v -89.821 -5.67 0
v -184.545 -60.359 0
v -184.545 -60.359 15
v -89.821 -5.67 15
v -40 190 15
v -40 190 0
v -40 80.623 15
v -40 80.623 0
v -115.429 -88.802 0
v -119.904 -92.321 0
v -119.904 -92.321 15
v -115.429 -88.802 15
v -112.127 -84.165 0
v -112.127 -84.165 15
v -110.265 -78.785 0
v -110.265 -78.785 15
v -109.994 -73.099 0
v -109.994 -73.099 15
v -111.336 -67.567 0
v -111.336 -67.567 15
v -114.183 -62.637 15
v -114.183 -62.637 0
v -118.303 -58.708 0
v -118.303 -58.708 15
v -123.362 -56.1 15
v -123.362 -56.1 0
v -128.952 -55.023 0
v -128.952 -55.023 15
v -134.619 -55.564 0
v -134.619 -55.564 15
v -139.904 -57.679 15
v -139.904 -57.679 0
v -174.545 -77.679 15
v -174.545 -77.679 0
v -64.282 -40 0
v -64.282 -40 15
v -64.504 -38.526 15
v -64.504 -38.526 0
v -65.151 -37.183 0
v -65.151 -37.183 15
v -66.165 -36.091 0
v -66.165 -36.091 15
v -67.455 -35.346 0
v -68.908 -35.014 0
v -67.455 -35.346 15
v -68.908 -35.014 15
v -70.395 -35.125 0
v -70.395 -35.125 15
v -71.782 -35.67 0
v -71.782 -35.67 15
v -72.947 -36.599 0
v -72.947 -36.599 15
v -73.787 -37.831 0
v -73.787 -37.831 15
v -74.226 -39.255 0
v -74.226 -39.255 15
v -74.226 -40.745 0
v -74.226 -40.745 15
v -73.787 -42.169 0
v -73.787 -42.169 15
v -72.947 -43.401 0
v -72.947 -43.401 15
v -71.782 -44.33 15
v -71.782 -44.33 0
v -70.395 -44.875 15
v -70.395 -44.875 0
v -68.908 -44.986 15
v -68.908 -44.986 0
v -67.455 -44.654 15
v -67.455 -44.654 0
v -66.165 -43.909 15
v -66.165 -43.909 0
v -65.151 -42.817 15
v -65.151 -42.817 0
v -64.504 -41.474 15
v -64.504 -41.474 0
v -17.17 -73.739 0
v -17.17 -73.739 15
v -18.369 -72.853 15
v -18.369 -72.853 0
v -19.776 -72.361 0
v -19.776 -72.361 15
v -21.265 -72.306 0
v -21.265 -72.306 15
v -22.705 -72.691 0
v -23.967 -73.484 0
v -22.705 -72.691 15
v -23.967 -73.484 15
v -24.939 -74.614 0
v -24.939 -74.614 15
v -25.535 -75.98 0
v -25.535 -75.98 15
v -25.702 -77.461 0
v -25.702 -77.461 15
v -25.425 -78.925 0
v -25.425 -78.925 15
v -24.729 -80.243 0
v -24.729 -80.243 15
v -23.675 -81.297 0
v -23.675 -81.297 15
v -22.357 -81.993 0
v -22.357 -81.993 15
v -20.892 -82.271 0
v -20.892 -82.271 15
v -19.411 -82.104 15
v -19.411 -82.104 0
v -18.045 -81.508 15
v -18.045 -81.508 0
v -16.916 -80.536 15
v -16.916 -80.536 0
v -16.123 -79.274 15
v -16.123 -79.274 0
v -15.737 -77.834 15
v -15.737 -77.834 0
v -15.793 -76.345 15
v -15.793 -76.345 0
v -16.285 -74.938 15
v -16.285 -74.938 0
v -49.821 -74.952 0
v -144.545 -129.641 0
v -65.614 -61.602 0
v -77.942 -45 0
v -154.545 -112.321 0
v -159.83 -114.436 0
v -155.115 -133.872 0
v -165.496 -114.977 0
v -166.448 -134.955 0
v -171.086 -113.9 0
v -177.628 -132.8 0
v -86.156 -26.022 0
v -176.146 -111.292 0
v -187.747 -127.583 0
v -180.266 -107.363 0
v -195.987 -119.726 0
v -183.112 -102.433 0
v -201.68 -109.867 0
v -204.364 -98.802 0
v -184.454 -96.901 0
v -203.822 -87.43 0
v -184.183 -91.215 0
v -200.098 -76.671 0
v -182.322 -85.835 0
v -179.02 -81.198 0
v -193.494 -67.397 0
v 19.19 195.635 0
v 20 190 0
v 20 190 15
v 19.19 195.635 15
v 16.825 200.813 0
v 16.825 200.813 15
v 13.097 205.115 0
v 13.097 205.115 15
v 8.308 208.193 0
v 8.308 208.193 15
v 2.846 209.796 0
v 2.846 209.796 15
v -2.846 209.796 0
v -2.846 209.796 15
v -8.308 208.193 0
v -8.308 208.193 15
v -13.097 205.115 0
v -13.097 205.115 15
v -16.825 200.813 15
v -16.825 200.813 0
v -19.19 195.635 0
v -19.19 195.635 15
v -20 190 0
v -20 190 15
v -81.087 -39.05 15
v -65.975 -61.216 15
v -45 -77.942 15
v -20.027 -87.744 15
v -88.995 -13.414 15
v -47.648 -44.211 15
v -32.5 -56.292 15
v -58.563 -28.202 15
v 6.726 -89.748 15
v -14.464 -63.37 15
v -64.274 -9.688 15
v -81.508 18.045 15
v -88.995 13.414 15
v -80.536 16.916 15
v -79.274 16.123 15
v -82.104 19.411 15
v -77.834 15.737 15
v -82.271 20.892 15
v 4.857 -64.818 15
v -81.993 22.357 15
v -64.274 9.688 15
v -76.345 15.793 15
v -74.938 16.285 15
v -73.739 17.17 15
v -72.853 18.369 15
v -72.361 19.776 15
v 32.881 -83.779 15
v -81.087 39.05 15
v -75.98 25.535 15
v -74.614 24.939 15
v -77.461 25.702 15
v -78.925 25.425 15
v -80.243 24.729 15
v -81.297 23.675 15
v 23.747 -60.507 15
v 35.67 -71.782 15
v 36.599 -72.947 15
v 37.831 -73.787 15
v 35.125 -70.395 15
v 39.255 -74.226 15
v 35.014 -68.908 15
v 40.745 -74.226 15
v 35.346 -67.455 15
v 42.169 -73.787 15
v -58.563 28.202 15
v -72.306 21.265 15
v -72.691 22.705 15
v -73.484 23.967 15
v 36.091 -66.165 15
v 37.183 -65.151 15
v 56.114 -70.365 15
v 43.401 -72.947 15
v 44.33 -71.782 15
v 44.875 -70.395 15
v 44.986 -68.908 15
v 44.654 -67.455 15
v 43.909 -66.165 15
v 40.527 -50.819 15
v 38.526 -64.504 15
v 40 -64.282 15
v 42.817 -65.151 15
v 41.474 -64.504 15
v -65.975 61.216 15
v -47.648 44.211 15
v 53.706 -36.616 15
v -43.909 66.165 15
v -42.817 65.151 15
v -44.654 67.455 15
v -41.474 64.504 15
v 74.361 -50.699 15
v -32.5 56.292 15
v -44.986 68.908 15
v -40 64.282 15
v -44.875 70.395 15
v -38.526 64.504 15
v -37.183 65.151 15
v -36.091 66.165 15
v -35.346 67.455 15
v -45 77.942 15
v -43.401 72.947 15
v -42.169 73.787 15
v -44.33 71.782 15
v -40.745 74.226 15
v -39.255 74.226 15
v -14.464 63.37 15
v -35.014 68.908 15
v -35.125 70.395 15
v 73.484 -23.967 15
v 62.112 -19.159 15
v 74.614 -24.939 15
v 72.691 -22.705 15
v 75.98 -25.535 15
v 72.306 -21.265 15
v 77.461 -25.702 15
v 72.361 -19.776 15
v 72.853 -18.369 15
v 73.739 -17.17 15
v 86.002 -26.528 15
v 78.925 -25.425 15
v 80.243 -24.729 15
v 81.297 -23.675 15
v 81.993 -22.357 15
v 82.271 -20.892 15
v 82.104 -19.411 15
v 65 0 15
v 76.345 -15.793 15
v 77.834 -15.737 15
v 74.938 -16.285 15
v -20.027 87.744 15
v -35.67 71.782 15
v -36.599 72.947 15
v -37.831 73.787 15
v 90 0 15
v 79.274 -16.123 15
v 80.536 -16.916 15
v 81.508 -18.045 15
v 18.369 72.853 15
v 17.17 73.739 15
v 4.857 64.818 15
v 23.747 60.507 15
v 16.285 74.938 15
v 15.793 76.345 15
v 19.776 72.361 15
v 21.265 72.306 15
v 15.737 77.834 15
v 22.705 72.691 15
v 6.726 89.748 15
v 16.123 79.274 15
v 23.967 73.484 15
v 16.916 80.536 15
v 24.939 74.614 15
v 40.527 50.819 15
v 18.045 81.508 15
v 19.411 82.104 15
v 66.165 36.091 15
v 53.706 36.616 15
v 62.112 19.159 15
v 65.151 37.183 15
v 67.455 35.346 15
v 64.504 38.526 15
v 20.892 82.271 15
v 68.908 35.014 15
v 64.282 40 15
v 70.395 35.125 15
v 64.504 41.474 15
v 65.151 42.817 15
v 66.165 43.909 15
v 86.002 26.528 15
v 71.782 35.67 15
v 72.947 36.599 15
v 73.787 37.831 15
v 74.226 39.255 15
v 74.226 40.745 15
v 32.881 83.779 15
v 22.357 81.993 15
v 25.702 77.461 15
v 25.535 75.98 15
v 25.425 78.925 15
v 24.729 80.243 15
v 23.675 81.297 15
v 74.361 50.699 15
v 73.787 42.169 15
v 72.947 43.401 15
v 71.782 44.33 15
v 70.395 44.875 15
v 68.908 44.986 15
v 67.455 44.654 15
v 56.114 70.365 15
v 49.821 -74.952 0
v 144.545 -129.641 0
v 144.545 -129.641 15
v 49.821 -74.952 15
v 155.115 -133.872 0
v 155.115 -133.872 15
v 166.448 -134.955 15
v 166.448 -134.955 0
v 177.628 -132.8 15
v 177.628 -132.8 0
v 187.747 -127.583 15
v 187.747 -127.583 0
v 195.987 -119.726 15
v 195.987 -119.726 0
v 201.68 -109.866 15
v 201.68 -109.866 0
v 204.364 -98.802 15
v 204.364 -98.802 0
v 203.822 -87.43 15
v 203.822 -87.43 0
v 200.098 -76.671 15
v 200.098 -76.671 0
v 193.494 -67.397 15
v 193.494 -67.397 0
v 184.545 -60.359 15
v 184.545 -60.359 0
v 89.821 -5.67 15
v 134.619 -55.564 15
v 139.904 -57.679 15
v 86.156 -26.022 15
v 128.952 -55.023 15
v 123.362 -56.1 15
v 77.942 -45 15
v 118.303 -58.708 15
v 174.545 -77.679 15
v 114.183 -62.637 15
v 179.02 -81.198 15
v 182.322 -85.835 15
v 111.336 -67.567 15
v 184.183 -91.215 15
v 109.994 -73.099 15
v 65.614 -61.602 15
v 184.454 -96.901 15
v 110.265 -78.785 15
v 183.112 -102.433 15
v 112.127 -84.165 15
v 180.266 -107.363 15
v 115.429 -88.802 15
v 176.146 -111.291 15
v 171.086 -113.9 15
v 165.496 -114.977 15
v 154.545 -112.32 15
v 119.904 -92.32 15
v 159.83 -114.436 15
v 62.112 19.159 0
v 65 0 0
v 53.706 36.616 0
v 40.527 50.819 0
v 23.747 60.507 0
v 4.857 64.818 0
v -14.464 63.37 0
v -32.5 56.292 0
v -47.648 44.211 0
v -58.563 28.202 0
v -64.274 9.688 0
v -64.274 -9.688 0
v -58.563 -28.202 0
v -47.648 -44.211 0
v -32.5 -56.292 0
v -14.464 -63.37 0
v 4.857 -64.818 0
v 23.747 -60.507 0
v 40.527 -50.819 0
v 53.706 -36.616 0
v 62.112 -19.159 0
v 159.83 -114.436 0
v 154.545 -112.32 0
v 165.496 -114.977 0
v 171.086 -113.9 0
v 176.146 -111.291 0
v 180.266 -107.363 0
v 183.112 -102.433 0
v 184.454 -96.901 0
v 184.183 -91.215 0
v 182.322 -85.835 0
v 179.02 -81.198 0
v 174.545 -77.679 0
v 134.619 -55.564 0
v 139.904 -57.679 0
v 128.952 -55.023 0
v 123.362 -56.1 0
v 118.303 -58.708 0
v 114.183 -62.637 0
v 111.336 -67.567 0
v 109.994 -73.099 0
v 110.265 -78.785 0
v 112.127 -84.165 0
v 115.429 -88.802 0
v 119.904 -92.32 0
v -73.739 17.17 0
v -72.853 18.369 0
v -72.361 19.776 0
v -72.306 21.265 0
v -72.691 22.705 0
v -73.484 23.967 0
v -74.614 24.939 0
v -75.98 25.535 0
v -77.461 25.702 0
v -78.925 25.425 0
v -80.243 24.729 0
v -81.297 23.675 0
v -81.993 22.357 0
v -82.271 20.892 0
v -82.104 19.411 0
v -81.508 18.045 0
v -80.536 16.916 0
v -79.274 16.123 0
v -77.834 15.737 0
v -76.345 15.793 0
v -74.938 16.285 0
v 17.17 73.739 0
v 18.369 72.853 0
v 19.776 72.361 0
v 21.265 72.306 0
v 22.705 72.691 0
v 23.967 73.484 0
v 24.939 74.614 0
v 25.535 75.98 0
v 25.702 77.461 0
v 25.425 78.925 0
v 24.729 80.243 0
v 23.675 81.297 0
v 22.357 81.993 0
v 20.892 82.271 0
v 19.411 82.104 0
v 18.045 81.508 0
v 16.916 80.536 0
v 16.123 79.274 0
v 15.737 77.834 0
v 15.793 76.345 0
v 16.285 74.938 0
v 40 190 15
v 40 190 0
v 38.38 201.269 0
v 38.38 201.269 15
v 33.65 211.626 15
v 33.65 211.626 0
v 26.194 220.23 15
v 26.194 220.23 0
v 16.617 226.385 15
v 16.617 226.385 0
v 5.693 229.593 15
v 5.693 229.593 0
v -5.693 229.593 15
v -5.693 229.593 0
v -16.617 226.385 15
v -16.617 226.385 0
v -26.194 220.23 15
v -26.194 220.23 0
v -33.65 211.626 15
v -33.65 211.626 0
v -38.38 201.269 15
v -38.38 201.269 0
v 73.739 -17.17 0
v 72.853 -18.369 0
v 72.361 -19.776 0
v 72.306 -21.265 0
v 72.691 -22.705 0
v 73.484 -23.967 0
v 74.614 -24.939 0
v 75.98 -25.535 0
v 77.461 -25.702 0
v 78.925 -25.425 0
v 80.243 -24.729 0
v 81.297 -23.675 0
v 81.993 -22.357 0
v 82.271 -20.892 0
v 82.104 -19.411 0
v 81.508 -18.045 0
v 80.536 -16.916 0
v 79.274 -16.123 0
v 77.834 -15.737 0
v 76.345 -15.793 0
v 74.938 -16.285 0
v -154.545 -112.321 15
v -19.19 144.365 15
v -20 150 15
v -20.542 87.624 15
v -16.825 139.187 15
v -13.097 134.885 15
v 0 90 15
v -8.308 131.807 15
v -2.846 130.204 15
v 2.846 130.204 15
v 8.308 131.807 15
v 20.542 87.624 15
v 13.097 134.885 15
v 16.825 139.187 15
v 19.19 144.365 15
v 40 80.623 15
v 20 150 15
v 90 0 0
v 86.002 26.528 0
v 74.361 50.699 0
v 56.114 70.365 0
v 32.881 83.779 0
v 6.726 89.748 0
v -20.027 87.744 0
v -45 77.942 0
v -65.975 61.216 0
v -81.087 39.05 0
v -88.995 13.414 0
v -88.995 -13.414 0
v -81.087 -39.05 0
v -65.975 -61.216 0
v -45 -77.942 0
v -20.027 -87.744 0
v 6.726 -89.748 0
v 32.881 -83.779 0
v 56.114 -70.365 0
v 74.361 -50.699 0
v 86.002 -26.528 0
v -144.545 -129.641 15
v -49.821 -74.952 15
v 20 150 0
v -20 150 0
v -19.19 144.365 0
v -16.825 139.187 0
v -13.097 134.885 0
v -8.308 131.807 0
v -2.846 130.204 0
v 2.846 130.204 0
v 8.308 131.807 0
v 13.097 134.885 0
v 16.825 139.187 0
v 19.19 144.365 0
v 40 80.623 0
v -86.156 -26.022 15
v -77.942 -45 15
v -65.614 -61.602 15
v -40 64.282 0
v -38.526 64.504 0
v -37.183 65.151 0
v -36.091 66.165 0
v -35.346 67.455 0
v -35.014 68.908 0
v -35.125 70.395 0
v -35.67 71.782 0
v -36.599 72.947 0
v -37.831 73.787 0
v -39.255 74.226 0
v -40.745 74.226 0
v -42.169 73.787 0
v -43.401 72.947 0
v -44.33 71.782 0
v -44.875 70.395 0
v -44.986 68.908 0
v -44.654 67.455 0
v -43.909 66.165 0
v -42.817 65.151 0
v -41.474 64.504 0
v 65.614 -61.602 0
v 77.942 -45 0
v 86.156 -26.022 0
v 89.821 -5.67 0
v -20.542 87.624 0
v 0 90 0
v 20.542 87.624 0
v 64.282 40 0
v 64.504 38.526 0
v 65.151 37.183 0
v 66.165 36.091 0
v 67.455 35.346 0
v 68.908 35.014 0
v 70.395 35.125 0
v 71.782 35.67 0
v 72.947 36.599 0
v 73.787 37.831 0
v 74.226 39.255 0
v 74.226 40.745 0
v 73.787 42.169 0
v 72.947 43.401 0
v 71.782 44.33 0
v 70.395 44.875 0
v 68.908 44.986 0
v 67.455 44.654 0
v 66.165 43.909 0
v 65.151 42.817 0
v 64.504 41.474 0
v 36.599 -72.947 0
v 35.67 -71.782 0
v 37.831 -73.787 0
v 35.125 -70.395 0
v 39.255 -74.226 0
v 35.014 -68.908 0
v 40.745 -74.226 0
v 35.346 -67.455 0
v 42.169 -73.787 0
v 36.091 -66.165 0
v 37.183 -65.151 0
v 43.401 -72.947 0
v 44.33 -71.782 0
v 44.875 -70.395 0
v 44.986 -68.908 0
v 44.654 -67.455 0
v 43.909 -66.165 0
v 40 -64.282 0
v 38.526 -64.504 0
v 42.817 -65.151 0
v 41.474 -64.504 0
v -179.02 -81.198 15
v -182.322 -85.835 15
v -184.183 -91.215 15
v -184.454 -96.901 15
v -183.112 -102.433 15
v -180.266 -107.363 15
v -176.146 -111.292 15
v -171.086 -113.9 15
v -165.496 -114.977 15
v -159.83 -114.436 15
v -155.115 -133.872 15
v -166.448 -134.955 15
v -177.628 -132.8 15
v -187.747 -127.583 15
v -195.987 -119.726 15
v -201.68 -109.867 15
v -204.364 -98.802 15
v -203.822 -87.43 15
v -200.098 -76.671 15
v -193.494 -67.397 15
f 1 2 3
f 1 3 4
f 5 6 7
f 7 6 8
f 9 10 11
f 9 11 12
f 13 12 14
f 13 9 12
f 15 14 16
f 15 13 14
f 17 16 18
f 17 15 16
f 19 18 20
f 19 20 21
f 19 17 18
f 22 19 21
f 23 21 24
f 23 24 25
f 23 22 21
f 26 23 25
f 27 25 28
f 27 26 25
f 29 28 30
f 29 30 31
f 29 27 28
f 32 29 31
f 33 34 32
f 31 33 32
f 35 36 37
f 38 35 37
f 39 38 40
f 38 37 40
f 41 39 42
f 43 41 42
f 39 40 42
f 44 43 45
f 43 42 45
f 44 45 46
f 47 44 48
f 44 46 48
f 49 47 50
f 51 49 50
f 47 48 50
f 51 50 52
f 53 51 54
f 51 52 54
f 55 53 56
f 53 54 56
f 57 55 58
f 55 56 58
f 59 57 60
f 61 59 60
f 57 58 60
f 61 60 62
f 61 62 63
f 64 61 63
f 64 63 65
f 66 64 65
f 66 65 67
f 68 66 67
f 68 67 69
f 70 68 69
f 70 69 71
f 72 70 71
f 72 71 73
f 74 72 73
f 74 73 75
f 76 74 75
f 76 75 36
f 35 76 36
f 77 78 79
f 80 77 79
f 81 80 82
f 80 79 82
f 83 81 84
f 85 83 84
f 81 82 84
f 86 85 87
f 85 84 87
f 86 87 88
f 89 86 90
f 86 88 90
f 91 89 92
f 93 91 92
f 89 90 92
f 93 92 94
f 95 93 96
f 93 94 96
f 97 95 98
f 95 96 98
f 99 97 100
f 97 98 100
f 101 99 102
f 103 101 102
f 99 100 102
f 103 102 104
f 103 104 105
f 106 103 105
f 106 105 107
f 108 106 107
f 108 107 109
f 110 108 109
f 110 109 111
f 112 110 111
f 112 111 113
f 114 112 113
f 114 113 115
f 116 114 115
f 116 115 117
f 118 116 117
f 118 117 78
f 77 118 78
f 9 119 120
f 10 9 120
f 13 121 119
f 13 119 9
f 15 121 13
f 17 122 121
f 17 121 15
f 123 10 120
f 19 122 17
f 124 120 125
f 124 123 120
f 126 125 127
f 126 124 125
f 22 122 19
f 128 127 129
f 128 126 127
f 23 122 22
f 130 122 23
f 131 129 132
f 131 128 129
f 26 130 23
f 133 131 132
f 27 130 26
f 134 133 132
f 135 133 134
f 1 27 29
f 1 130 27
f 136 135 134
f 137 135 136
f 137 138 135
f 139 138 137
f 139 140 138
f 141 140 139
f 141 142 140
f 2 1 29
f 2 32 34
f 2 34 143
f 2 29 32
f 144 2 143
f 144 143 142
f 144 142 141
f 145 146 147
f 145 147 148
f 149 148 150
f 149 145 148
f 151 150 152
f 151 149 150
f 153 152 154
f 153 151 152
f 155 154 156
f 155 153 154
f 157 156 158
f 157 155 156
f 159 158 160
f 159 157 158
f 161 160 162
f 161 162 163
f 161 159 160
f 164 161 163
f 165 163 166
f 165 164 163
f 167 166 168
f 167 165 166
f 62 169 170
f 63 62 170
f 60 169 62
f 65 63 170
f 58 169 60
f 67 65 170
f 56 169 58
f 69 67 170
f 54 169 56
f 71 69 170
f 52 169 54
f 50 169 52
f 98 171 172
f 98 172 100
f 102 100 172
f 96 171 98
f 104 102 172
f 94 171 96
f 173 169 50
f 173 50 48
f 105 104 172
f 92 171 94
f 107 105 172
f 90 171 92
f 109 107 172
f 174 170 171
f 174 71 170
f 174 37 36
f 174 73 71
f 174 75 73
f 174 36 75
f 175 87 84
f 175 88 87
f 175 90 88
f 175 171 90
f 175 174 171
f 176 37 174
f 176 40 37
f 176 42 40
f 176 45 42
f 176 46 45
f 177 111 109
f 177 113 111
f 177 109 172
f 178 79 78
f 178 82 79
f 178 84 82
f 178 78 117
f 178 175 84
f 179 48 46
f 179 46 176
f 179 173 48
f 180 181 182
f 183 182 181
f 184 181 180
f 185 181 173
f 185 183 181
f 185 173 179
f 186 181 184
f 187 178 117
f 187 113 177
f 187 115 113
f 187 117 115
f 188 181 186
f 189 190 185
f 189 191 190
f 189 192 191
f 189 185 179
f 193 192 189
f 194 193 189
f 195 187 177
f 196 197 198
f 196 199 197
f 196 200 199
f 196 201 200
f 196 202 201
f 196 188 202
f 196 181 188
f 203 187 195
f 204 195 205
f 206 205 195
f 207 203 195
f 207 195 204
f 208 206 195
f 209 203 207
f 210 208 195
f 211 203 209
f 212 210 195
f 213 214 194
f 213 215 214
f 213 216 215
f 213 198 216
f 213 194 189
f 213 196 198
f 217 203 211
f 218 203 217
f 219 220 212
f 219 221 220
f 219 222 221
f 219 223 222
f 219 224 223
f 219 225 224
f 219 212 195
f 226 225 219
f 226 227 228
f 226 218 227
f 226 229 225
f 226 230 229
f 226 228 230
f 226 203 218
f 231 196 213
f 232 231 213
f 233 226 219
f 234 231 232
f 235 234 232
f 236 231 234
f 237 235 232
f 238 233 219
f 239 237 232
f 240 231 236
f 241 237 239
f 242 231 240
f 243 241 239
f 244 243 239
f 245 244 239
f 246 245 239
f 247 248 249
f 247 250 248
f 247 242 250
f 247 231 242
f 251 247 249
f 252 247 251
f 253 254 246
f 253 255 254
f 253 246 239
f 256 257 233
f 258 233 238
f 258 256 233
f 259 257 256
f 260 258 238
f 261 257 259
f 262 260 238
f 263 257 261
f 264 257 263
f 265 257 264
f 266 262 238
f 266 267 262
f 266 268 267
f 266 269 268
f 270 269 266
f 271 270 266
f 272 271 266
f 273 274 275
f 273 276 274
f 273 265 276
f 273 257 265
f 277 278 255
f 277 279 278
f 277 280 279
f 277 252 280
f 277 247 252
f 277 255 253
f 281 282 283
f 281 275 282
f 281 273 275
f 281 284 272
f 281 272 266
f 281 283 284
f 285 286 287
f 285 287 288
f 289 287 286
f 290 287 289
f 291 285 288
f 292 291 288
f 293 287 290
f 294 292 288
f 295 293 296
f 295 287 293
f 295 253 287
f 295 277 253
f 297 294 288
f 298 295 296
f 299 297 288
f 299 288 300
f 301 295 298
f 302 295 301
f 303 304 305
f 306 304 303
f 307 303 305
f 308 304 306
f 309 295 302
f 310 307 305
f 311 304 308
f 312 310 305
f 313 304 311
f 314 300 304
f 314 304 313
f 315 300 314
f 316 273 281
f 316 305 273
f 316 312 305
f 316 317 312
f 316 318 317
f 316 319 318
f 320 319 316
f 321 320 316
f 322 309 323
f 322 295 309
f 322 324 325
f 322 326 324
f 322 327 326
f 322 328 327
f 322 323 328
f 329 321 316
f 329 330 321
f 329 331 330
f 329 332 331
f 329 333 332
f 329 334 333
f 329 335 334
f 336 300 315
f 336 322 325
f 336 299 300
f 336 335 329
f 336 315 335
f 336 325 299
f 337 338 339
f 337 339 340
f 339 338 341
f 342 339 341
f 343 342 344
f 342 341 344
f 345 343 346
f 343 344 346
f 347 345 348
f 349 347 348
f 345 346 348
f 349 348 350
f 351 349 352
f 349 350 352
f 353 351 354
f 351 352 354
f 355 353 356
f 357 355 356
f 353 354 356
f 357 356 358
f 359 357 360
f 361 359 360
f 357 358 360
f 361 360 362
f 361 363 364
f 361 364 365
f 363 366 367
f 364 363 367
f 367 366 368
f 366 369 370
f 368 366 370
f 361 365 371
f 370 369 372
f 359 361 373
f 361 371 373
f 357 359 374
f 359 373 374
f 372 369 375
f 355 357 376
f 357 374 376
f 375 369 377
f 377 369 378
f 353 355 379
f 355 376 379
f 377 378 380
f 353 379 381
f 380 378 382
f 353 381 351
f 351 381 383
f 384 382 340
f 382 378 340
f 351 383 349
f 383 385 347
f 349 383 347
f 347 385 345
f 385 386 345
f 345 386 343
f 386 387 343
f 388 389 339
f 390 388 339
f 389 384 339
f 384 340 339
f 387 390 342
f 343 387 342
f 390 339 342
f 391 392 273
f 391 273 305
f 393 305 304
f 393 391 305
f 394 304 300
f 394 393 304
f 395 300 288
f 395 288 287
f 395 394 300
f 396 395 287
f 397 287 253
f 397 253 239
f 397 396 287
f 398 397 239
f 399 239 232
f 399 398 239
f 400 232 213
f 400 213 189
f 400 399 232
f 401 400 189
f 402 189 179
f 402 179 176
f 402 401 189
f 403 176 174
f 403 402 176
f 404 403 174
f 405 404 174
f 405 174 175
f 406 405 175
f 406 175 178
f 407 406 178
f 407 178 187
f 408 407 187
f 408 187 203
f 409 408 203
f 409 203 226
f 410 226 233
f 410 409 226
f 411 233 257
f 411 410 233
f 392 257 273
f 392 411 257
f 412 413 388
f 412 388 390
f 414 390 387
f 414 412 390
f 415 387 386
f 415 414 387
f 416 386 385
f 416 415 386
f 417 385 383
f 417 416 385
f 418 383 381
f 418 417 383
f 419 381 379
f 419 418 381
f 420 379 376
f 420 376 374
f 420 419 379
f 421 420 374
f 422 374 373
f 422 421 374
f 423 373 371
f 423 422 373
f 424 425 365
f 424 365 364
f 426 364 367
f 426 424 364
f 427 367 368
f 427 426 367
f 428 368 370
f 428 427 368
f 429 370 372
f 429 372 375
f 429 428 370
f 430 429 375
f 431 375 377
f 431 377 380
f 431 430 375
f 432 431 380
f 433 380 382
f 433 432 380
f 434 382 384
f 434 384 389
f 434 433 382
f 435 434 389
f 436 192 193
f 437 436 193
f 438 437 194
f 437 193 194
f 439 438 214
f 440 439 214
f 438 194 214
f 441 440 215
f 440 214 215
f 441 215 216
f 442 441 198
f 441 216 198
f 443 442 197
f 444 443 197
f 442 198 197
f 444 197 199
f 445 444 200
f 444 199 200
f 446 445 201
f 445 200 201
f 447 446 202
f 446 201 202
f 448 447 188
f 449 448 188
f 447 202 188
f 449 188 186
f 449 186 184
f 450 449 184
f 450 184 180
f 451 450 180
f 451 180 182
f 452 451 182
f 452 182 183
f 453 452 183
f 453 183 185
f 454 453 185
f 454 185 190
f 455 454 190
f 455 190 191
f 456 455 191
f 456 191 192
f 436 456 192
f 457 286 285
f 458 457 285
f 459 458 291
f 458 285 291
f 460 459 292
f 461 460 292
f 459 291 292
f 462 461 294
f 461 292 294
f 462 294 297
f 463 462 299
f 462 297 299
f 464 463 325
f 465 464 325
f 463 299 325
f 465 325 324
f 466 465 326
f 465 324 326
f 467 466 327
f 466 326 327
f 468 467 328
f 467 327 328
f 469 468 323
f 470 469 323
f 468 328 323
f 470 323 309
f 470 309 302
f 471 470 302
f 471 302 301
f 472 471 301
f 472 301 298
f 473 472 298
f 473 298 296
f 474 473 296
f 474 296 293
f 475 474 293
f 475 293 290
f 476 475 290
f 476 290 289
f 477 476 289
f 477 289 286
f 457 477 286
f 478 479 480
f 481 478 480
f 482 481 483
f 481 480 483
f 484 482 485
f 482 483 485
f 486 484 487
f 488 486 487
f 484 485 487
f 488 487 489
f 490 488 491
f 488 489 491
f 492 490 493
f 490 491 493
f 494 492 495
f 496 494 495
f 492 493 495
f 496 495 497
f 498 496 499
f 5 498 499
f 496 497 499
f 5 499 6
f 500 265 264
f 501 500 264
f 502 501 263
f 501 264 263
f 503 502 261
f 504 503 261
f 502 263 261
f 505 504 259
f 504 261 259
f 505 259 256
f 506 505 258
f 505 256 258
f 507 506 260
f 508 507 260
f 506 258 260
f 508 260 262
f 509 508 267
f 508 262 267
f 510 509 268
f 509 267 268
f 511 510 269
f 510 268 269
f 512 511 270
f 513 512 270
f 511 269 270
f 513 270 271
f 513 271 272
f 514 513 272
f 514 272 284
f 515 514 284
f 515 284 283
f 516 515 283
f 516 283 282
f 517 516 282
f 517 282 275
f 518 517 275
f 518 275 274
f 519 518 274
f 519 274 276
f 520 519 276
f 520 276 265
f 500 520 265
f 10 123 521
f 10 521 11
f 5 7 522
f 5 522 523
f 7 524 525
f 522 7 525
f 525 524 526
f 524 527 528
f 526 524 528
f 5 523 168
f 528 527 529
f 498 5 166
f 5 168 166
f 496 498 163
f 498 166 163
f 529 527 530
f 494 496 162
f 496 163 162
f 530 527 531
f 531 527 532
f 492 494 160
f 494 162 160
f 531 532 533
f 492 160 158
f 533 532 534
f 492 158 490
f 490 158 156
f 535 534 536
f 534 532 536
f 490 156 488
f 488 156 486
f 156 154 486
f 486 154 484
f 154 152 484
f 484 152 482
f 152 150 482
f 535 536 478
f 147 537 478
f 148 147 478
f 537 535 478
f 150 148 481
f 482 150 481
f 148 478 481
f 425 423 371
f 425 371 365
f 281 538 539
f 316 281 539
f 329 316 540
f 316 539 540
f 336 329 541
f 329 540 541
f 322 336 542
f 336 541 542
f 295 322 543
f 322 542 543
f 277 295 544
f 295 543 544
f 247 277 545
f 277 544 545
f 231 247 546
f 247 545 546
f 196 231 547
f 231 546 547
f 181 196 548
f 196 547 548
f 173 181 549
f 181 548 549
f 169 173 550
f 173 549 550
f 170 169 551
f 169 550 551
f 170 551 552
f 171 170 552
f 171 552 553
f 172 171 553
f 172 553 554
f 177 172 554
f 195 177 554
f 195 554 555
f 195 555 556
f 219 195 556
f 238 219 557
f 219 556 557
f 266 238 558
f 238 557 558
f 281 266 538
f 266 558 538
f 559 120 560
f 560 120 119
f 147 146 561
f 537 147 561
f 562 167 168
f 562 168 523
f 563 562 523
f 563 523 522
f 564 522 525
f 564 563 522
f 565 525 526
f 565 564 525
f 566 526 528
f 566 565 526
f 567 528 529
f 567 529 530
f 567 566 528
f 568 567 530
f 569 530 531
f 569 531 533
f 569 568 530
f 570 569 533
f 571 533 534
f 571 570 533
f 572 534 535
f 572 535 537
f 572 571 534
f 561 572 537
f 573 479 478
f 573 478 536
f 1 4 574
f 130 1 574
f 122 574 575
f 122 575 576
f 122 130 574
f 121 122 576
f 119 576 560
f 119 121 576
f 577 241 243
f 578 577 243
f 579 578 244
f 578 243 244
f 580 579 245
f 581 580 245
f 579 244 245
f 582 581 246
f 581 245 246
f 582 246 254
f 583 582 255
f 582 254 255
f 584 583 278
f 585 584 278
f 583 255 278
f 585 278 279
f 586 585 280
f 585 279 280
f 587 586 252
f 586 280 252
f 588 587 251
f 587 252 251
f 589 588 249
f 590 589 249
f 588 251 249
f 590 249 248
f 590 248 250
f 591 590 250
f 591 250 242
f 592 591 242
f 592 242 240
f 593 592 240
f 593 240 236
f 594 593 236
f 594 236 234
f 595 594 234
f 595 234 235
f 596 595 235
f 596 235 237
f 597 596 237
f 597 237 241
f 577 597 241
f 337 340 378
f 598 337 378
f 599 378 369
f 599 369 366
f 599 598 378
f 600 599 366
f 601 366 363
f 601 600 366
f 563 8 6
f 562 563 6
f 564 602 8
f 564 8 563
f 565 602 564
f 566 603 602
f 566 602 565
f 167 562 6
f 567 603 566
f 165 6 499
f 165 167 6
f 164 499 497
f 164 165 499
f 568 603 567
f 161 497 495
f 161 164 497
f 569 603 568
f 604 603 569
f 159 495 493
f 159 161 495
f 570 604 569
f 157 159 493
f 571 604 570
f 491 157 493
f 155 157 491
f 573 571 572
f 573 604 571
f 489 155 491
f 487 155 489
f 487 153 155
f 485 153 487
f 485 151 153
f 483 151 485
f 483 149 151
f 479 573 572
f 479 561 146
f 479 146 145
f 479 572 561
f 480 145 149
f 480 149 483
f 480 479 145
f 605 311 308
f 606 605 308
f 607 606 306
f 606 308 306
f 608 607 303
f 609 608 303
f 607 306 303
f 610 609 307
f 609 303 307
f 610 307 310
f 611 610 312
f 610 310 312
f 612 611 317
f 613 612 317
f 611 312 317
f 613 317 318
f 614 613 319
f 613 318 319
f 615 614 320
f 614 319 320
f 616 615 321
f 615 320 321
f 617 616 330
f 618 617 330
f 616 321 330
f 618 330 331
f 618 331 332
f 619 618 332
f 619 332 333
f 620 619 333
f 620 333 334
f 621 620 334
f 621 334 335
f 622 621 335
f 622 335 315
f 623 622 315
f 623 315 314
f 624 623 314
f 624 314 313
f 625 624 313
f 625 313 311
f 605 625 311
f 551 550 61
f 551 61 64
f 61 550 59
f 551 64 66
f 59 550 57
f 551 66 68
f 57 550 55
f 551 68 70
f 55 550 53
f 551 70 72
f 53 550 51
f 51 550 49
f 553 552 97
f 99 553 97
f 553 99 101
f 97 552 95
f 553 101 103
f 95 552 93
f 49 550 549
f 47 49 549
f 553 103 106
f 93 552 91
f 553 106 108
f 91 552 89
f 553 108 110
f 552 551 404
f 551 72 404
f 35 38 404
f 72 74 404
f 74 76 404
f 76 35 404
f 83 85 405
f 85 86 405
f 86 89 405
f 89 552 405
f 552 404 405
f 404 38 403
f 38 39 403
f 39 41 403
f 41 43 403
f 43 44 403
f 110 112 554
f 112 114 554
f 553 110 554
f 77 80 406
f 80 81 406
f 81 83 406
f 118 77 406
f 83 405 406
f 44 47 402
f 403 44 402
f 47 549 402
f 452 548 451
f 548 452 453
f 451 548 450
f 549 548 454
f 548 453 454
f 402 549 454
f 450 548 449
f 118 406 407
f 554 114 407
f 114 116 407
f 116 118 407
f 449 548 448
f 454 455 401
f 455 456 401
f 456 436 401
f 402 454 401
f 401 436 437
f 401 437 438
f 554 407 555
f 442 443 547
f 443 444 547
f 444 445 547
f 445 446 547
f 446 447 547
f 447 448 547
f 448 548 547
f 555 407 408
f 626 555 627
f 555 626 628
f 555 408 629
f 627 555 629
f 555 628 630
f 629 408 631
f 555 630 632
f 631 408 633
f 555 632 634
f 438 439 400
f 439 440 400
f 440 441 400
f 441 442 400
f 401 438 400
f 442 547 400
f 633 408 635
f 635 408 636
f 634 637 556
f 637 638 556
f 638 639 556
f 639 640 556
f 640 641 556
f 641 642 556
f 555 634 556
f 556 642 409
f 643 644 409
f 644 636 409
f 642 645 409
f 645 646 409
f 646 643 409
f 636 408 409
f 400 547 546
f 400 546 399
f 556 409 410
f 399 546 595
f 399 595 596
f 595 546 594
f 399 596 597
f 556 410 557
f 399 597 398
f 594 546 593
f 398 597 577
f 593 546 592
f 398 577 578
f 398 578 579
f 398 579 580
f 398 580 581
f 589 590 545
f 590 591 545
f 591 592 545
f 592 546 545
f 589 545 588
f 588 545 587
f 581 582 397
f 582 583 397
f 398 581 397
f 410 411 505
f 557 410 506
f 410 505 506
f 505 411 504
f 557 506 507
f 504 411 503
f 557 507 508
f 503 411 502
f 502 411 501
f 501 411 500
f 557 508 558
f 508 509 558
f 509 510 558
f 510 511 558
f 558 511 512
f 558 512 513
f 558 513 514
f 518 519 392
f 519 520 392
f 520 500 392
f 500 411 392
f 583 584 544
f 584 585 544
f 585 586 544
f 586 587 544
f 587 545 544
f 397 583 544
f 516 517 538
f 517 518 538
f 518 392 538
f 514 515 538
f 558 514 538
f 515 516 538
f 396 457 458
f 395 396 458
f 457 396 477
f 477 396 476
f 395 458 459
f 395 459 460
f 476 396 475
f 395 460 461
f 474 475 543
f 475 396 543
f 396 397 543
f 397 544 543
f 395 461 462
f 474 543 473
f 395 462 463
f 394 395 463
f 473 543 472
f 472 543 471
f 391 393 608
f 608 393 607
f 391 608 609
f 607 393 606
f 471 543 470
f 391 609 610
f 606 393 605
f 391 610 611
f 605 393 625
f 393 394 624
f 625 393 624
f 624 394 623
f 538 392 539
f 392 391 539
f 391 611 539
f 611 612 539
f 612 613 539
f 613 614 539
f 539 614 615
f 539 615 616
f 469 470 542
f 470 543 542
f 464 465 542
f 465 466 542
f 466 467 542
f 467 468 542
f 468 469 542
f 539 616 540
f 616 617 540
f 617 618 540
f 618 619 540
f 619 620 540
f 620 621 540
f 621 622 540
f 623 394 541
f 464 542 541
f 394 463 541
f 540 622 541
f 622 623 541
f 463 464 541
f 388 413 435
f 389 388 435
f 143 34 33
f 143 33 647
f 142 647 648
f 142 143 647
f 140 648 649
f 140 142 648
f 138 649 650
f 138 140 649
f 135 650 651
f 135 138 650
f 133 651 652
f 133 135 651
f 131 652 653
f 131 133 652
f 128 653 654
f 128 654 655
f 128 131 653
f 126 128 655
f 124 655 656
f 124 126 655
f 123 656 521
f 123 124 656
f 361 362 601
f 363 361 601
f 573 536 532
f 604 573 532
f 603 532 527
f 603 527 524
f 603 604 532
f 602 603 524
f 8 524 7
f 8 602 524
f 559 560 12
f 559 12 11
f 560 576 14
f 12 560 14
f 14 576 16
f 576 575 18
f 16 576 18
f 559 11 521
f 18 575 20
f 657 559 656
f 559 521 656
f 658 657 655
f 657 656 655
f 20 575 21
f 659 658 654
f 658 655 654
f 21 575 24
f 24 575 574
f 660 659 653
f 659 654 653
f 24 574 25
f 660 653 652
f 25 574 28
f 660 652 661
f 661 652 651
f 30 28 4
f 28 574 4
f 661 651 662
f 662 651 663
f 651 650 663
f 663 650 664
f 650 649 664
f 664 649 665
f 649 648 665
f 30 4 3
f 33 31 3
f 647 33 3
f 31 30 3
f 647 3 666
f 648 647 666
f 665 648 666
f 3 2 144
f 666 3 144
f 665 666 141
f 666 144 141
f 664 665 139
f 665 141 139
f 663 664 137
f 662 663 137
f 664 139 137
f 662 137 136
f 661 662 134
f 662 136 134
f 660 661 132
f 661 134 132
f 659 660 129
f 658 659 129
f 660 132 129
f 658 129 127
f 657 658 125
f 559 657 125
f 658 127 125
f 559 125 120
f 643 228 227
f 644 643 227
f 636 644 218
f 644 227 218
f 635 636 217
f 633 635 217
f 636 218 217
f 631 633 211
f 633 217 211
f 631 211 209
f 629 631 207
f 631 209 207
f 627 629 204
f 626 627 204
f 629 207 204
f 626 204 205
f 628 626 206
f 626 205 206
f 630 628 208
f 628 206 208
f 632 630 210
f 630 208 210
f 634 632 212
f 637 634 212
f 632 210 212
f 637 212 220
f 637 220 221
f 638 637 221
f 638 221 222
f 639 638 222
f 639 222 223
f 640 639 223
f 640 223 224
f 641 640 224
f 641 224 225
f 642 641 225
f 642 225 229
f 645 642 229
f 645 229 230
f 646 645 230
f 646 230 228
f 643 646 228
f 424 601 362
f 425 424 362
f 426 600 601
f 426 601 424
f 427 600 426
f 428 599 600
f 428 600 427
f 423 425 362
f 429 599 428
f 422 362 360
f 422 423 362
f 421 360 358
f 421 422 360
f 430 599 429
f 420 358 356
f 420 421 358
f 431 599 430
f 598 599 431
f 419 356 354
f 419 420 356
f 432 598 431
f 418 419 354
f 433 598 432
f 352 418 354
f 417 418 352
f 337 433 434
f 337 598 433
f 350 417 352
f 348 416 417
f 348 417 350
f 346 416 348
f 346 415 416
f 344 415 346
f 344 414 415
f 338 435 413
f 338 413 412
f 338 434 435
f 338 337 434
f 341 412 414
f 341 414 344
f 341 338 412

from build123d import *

# Parameters (mm, degrees)
SKETCH_R           = 90
SKETCH_R_2         = 65
PAD_DEPTH          = 15
SKETCH001_R        = 5
POCKET_DEPTH       = 525.001
POLARPATTERN_COUNT = 8
PAD001_DEPTH       = 15
PAD002_DEPTH       = 15
PAD003_DEPTH       = 15


with BuildPart() as polarpattern:
    # Sketch → Pad (new body)
    with BuildSketch(Plane.XY):
        Circle(SKETCH_R)
        Circle(SKETCH_R_2, mode=Mode.SUBTRACT)
    extrude(amount=PAD_DEPTH)

    # Sketch001 → Pocket (cut, through all)
    with BuildSketch(Plane.XY.offset(15)):
        with Locations((-69.282032, -40)):
            Circle(SKETCH001_R)
    pocket = extrude(amount=-POCKET_DEPTH, mode=Mode.SUBTRACT)

    # PolarPattern: Pocket ×8 about axis
    polarpattern_axis = Axis((0, 0, 15), (0, 0, 1))
    for i in range(1, POLARPATTERN_COUNT):
        add(pocket.rotate(polarpattern_axis, i * 360 / POLARPATTERN_COUNT), mode=Mode.SUBTRACT)


with BuildPart() as pad001:
    # Sketch002 → Pad001 (new body)
    with BuildSketch(Plane.XY):
        with BuildLine():
            Line((-184.544864, -60.359005), (-89.8212, -5.670273))
            ThreePointArc((-89.8212, -5.670273), (-77.942286, -45), (-49.8212, -74.952305))
            Line((-144.544864, -129.641038), (-49.8212, -74.952305))
            ThreePointArc((-184.544864, -60.359005), (-199.185843, -115), (-144.544864, -129.641038))
        make_face()
        with BuildLine():
            ThreePointArc((-174.544827, -77.679492), (-181.865335, -105), (-154.544827, -112.320508))
            Line((-154.544827, -112.320508), (-119.903811, -92.320508))
            ThreePointArc((-119.903811, -92.320508), (-112.583302, -65), (-139.903811, -57.679492))
            Line((-174.544827, -77.679492), (-139.903811, -57.679492))
        make_face(mode=Mode.SUBTRACT)
    extrude(amount=PAD001_DEPTH)


with BuildPart() as pad002:
    # Sketch003 → Pad002 (new body)
    with BuildSketch(Plane(origin=(0, 0, 0), x_dir=(-0.5, 0.866025, 0), z_dir=(0, 0, 1))):
        with BuildLine():
            Line((-184.544864, -60.359005), (-89.8212, -5.670273))
            ThreePointArc((-89.8212, -5.670273), (-77.942286, -45), (-49.8212, -74.952305))
            Line((-144.544864, -129.641038), (-49.8212, -74.952305))
            ThreePointArc((-184.544864, -60.359005), (-199.185843, -115), (-144.544864, -129.641038))
        make_face()
        with BuildLine():
            ThreePointArc((-174.544827, -77.679492), (-181.865335, -105), (-154.544827, -112.320508))
            Line((-154.544827, -112.320508), (-119.903811, -92.320508))
            ThreePointArc((-119.903811, -92.320508), (-112.583302, -65), (-139.903811, -57.679492))
            Line((-174.544827, -77.679492), (-139.903811, -57.679492))
        make_face(mode=Mode.SUBTRACT)
    extrude(amount=PAD002_DEPTH)


with BuildPart() as pad003:
    # Sketch004 → Pad003 (new body)
    with BuildSketch(Plane(origin=(0, 0, 0), x_dir=(-0.5, -0.866025, 0), z_dir=(0, 0, 1))):
        with BuildLine():
            Line((-184.544864, -60.359005), (-89.8212, -5.670273))
            ThreePointArc((-89.8212, -5.670273), (-77.942286, -45), (-49.8212, -74.952305))
            Line((-144.544864, -129.641038), (-49.8212, -74.952305))
            ThreePointArc((-184.544864, -60.359005), (-199.185843, -115), (-144.544864, -129.641038))
        make_face()
        with BuildLine():
            ThreePointArc((-174.544827, -77.679492), (-181.865335, -105), (-154.544827, -112.320508))
            Line((-154.544827, -112.320508), (-119.903811, -92.320508))
            ThreePointArc((-119.903811, -92.320508), (-112.583302, -65), (-139.903811, -57.679492))
            Line((-174.544827, -77.679492), (-139.903811, -57.679492))
        make_face(mode=Mode.SUBTRACT)
    extrude(amount=PAD003_DEPTH)


solid = Compound([polarpattern.part, pad001.part, pad002.part, pad003.part])
